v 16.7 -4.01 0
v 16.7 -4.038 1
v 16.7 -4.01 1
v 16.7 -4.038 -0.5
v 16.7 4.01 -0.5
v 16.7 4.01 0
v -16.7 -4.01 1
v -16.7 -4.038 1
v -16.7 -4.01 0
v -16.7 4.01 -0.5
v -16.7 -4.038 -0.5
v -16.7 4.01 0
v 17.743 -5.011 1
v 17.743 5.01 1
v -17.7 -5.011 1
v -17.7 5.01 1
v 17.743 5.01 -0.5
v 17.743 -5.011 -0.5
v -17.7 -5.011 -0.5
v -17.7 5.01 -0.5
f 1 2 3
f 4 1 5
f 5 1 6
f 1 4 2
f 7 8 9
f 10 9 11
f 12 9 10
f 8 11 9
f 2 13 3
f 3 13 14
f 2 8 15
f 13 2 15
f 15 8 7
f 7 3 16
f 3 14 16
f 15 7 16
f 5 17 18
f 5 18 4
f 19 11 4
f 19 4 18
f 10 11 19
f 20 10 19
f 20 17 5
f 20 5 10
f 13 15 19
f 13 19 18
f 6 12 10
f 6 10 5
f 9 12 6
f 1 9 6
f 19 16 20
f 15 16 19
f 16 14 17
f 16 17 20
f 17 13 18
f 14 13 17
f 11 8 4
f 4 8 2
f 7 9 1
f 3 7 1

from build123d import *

# Parameters (mm, degrees)
SKETCH_1_W      = 33.4
SKETCH_1_H      = 8.02
EXTRUDE_1_DEPTH = 1
SKETCH_2_W      = 33.4
SKETCH_2_H      = 8.047596292
EXTRUDE_2_DEPTH = 1.5


with BuildPart() as part:
    # 스케치1 → 보스-돌출1 (new body)
    with BuildSketch(Plane.XY):
        Rectangle(SKETCH_1_W, SKETCH_1_H)
    extrude(amount=EXTRUDE_1_DEPTH)

    # 스케치2 → 보스-돌출2 (add)
    with BuildSketch(Plane.XY.offset(1)):
        Polygon((-16.7, 5.01), (17.743446376, 5.01), (17.743446376, 4.01), (17.743446376, -5.011), (16.7, -5.011), (-17.7, -5.011), (-17.7, -4.037596292), (-17.7, 5.01), align=None)
        with Locations((0, -0.013798146)):
            Rectangle(SKETCH_2_W, SKETCH_2_H, mode=Mode.SUBTRACT)
    extrude(amount=-EXTRUDE_2_DEPTH)


solid = part.part
